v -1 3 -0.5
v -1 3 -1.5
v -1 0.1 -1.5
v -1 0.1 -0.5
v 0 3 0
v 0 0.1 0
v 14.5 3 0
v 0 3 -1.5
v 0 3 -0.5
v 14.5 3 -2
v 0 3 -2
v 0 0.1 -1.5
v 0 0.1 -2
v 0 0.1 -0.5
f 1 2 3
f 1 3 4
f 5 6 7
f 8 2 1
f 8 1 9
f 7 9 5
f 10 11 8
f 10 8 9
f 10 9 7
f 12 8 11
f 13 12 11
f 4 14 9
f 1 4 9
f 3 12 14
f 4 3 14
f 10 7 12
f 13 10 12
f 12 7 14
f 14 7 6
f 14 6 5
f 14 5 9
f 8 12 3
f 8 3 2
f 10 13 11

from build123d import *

# Parameters (mm, degrees)
SKETCH2_W           = 14.5
SKETCH2_H           = 2
BOSS_EXTRUDE1_DEPTH = 3
CUT_EXTRUDE2_DEPTH  = 10
SKETCH6_W           = 1
SKETCH6_H           = 2.899999999
BOSS_EXTRUDE3_DEPTH = 1


with BuildPart() as part:
    # Sketch2 → Boss-Extrude1 (new body)
    with BuildSketch(Plane(origin=(0, 0, 0), x_dir=(1, 0, 0), z_dir=(0, 1, 0))):
        with Locations((7.25, 1)):
            Rectangle(SKETCH2_W, SKETCH2_H)
    extrude(amount=BOSS_EXTRUDE1_DEPTH)

    # Sketch5 → Cut-Extrude2 (cut)
    with BuildSketch(Plane.XY):
        Polygon((14.5, 3), (-1.189290811, -0.137858161), (14.5, -0.137858161), align=None)
    extrude(amount=-CUT_EXTRUDE2_DEPTH, mode=Mode.SUBTRACT)

    # Sketch6 → Boss-Extrude3 (add)
    with BuildSketch(Plane.ZY):
        with Locations((-1, 1.550000001)):
            Rectangle(SKETCH6_W, SKETCH6_H)
    extrude(amount=BOSS_EXTRUDE3_DEPTH)


solid = part.part
